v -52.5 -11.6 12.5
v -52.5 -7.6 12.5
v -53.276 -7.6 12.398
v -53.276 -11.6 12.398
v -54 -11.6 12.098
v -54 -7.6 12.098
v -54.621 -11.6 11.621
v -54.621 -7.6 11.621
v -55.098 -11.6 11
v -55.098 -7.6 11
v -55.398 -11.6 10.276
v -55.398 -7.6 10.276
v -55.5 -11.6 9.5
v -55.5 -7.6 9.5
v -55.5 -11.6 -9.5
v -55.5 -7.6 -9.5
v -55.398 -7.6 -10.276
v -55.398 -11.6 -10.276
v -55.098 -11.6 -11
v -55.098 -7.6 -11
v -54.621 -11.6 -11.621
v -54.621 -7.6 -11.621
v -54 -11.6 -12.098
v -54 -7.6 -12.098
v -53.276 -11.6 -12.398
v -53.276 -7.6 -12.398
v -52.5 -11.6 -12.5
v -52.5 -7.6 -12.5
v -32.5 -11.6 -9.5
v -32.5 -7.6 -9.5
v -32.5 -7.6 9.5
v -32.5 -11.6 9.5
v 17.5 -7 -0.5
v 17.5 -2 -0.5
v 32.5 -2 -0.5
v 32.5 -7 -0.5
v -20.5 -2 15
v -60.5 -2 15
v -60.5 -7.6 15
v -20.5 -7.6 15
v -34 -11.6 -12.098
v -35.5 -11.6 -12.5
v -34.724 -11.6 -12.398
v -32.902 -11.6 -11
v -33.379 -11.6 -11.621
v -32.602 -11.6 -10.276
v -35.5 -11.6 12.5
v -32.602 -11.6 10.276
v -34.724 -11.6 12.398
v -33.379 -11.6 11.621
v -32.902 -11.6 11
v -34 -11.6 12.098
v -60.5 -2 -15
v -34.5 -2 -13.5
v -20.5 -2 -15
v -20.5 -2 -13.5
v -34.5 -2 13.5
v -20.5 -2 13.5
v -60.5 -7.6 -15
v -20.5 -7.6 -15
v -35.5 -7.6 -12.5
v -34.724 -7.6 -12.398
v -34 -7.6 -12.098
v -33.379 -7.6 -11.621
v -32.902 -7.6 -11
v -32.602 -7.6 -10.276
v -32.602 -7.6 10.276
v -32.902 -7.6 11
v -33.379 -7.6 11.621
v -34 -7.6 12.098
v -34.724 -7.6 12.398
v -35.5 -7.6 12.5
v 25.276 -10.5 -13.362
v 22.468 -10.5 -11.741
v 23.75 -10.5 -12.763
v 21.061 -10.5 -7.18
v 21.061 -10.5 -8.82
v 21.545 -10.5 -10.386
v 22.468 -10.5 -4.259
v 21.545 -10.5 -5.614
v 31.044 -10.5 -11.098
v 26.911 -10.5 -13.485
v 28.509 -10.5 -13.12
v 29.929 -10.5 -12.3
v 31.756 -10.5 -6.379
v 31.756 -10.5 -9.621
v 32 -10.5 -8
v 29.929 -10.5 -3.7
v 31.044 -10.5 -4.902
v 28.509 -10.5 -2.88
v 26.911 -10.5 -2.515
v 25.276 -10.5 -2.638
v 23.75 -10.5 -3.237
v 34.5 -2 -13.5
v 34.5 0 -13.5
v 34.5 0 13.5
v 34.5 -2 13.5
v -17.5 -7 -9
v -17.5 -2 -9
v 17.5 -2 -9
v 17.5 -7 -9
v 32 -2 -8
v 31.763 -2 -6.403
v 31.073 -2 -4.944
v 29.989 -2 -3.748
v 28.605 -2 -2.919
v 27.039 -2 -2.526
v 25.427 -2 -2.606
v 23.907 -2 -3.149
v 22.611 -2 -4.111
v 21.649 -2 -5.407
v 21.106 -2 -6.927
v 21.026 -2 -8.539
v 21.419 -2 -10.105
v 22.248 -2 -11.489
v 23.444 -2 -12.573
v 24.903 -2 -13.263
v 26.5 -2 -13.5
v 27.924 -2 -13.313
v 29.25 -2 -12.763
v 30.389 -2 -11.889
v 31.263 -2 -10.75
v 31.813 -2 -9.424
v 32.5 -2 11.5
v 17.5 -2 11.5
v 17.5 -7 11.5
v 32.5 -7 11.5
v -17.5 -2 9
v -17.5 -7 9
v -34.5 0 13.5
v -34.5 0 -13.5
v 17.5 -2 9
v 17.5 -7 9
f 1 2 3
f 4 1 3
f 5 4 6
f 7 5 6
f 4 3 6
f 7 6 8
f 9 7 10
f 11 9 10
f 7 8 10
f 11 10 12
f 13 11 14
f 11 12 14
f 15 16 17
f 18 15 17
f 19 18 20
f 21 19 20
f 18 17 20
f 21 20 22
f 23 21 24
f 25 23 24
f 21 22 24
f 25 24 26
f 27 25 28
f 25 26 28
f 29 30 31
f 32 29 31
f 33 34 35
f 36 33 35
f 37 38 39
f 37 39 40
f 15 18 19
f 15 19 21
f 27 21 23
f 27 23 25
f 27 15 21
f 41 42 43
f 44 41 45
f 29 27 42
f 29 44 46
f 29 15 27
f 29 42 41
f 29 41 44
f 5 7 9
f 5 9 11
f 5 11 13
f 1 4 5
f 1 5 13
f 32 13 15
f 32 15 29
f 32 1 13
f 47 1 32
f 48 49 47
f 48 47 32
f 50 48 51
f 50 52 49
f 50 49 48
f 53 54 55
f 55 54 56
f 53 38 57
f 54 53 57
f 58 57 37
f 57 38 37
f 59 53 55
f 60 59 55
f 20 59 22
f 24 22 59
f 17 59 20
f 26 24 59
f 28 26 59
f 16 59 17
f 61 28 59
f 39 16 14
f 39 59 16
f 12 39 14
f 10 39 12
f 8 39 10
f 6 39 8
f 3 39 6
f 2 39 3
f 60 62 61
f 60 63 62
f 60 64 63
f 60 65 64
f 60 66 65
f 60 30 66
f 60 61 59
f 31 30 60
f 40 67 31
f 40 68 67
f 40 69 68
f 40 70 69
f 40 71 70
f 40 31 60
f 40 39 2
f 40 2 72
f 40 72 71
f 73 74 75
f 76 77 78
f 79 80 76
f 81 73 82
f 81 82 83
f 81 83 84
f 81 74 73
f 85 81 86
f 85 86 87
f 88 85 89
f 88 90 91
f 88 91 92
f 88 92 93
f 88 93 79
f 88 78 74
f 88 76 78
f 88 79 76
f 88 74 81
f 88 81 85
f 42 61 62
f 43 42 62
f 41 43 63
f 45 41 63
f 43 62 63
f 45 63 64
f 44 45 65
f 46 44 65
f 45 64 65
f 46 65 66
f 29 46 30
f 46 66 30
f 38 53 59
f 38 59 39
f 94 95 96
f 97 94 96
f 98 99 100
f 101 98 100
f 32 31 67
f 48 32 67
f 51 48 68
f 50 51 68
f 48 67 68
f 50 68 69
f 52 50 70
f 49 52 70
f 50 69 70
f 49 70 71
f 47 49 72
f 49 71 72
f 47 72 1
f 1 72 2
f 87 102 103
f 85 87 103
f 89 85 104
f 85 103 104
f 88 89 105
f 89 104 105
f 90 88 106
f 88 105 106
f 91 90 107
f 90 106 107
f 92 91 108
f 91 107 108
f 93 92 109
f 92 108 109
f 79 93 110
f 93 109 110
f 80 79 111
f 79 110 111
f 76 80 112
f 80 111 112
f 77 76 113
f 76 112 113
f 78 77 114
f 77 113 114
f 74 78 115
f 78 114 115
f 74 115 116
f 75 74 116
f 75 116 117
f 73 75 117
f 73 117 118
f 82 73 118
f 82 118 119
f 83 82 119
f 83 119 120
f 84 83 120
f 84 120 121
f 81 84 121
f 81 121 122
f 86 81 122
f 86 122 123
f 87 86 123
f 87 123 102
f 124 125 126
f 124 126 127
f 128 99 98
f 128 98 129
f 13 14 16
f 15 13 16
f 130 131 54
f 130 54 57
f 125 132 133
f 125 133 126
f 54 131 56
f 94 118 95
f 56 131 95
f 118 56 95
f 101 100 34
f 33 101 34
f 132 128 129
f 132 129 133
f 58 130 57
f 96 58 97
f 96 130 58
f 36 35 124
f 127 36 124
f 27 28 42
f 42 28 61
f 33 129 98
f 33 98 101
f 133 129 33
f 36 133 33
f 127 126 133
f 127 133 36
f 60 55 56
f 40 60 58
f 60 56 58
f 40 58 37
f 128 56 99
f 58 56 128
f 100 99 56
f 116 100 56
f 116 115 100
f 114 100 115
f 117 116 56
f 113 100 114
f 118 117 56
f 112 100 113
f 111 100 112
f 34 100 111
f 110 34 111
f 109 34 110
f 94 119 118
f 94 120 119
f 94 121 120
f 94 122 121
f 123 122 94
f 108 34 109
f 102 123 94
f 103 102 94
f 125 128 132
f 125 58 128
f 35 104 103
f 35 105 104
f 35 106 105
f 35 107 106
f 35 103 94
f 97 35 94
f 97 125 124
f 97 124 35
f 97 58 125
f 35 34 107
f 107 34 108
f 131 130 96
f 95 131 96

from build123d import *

# Parameters (mm, degrees)
F0_W      = 69
F0_H      = 27
F1_DEPTH  = 2
F2_W      = 40
F2_H      = 30
F3_DEPTH  = 5.6
F4_W      = 35
F4_H      = 18
F5_DEPTH  = 5
F6_W      = 15
F6_H      = 12
F7_DEPTH  = 5
F8_R      = 5.5
F9_DEPTH  = 8.5
F11_DEPTH = 4


with BuildPart() as f1:
    # F0 (on Front) → F1 (new body)
    with BuildSketch(Plane.XZ):
        Rectangle(F0_W, F0_H)
    extrude(amount=F1_DEPTH)

    # F2 (on face) → F3 (join)
    with BuildSketch(Plane.XZ.offset(2)):
        with Locations((-40.5, 0)):
            Rectangle(F2_W, F2_H)
    extrude(amount=F3_DEPTH)

    # F4 (on face) → F5 (join)
    with BuildSketch(Plane.XZ.offset(2)):
        Rectangle(F4_W, F4_H)
    extrude(amount=F5_DEPTH)

    # F6 (on face) → F7 (join)
    with BuildSketch(Plane.XZ.offset(2)):
        with Locations((25, 5.5)):
            Rectangle(F6_W, F6_H)
    extrude(amount=F7_DEPTH)

    # F8 (on face) → F9 (join)
    with BuildSketch(Plane.XZ.offset(2)):
        with Locations((26.5, -8)):
            Circle(F8_R)
    extrude(amount=F9_DEPTH)

    # F10 (on face) → F11 (join)
    with BuildSketch(Plane.XZ.offset(7.6)):
        with BuildLine():
            Line((-35.5, 12.5), (-52.5, 12.5))
            ThreePointArc((-52.5, 12.5), (-54.62132, 11.62132), (-55.5, 9.5))
            Line((-55.5, 9.5), (-55.5, -9.5))
            ThreePointArc((-55.5, -9.5), (-54.62132, -11.62132), (-52.5, -12.5))
            Line((-52.5, -12.5), (-35.5, -12.5))
            ThreePointArc((-35.5, -12.5), (-33.37868, -11.62132), (-32.5, -9.5))
            Line((-32.5, -9.5), (-32.5, 9.5))
            ThreePointArc((-32.5, 9.5), (-33.37868, 11.62132), (-35.5, 12.5))
        make_face()
    extrude(amount=F11_DEPTH)


solid = f1.part
